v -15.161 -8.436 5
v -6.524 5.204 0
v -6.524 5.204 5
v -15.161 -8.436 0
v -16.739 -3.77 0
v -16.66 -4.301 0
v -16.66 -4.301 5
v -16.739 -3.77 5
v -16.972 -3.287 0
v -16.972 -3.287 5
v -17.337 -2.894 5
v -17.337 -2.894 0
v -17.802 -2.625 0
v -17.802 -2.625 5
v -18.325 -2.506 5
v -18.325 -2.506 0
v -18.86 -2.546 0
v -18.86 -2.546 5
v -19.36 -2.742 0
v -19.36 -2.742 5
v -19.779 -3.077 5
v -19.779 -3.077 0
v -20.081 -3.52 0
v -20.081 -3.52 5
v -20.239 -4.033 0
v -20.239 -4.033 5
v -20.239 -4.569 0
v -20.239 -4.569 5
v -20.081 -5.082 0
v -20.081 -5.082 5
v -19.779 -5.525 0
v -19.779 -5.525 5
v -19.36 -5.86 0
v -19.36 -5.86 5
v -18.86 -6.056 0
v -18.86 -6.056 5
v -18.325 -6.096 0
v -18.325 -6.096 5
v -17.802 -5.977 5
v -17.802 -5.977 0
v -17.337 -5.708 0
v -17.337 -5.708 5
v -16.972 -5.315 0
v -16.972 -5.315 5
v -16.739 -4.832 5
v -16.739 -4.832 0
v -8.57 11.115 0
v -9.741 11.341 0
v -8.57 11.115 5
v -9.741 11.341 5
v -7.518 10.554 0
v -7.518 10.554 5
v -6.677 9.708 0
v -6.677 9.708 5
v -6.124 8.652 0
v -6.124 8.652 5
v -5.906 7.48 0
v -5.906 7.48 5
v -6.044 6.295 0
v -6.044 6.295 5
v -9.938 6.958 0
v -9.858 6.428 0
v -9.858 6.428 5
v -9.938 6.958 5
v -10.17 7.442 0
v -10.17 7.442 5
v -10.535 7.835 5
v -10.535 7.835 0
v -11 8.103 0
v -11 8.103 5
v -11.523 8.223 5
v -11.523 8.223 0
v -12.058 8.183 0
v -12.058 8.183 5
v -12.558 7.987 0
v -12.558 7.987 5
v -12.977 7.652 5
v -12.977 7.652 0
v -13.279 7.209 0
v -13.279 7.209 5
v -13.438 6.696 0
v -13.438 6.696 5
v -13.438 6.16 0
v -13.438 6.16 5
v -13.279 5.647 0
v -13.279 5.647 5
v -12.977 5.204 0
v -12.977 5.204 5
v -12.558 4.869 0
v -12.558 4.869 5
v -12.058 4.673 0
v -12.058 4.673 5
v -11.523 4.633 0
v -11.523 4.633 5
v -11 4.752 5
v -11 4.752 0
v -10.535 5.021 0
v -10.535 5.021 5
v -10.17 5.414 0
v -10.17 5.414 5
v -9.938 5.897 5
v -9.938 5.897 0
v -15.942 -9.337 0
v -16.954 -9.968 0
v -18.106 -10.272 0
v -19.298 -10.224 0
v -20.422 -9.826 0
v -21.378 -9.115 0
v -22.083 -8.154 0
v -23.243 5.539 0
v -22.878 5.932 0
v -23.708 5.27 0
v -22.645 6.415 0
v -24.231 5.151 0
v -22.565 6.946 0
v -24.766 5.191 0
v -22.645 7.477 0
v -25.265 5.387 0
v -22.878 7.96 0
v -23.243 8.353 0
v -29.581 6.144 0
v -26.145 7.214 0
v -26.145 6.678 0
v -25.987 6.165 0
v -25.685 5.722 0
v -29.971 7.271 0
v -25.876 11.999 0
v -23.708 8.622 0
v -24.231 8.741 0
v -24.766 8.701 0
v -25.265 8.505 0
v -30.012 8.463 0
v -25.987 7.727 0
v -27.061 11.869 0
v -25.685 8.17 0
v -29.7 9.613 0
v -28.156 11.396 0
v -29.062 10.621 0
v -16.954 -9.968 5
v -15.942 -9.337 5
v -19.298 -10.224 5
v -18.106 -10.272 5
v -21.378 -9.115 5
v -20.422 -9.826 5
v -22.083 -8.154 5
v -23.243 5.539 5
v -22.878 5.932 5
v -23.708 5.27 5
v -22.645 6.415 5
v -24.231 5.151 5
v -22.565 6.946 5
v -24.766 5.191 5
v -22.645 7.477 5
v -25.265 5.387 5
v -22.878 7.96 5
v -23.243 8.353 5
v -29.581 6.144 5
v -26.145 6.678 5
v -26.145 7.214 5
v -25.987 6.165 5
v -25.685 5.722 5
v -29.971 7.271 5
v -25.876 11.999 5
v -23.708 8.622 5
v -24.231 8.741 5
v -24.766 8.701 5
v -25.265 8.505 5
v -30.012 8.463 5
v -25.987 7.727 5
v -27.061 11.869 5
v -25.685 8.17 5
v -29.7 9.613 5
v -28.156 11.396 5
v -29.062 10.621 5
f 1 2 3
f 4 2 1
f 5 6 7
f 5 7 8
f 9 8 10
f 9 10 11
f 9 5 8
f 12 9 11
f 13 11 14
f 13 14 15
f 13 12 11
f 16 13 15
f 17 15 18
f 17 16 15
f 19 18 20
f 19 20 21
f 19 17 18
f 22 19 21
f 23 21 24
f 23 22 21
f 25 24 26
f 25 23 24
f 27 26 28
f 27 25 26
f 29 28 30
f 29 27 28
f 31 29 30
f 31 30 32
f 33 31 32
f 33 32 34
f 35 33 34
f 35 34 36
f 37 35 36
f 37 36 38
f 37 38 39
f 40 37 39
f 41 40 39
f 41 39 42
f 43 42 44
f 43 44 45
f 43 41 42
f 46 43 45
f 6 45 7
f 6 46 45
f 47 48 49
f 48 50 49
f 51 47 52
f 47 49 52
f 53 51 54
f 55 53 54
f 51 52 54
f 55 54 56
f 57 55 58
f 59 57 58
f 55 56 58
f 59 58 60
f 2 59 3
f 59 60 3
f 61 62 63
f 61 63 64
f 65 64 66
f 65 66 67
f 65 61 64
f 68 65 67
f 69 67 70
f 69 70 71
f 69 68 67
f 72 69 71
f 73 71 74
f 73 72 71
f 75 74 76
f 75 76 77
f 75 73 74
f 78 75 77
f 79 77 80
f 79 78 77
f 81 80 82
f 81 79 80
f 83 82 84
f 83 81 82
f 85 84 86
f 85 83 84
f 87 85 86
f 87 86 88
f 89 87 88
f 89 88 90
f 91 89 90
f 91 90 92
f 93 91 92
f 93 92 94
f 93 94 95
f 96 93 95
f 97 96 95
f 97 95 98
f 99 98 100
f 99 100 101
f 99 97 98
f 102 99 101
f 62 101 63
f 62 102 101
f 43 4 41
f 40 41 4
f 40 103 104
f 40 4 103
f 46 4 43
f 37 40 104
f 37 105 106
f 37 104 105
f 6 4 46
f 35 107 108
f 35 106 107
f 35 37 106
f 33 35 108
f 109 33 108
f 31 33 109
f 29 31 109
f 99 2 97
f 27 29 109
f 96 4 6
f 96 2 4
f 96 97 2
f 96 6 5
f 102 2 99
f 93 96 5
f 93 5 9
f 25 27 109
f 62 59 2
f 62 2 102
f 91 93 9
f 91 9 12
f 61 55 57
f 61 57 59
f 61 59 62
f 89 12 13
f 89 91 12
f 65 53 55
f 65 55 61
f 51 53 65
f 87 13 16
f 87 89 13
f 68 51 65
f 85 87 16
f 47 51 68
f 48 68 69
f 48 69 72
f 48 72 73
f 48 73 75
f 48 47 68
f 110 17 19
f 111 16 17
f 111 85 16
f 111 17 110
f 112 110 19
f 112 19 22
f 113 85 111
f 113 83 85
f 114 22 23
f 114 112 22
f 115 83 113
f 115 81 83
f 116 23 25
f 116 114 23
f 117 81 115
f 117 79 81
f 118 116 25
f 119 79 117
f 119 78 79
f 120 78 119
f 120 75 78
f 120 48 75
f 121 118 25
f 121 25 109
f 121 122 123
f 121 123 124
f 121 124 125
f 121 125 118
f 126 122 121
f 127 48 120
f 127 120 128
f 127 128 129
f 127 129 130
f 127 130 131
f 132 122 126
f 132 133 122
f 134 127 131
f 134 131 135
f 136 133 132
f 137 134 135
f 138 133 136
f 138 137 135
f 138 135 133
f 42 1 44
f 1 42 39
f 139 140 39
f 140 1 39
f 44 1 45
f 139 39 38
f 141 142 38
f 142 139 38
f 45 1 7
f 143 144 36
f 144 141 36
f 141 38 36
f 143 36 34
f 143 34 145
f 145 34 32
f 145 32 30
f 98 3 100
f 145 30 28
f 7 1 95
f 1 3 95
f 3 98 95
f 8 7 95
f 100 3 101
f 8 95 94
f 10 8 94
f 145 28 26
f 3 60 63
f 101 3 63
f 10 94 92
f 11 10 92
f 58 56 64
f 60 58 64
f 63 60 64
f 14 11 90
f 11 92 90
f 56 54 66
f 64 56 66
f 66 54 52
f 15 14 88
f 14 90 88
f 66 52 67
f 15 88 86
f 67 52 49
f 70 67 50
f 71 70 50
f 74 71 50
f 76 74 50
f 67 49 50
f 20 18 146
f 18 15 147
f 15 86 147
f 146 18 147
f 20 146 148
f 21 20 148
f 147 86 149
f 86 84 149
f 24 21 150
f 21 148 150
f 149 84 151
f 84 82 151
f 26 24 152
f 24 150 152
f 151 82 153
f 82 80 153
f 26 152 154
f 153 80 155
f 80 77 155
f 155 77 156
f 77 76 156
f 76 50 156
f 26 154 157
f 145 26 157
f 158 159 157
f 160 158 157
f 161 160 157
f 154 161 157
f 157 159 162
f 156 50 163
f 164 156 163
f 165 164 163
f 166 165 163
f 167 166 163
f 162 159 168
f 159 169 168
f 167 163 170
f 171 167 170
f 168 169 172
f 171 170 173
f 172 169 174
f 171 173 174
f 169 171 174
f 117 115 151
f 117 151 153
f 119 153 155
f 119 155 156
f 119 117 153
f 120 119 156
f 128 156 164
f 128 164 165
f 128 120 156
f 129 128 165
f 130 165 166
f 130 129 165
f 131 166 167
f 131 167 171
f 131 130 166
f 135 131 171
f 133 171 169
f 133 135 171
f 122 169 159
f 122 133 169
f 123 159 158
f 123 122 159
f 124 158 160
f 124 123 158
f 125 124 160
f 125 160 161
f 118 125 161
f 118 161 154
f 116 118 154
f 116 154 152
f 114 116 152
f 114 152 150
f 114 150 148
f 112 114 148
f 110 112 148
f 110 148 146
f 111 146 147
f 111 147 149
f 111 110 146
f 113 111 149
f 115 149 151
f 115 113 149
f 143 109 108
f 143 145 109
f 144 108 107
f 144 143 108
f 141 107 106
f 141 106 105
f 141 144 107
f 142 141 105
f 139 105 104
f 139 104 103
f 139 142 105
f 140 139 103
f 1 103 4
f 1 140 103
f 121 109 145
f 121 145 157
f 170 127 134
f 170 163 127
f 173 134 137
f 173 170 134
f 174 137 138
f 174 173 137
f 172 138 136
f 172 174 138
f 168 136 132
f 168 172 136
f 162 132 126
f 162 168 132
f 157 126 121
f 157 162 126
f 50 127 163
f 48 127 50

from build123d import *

# Parameters (mm, degrees)
ESQUISSE1_R        = 1.8
BOSS_EXTRU_1_DEPTH = 5
CONG_1_R           = 4


with BuildPart() as part:
    # Esquisse1 → Boss.-Extru.1 (new body)
    with BuildSketch(Plane.XY):
        Polygon((-32.799356044, 12.280796054), (-2.817383551, 11.058367683), (-18.866700046, -14.287626874), align=None)
        with Locations((-18.459525699, -4.301037602)):
            Circle(ESQUISSE1_R, mode=Mode.SUBTRACT)
        with Locations((-24.365403682, 6.945977976)):
            Circle(ESQUISSE1_R, mode=Mode.SUBTRACT)
        with Locations((-11.657643474, 6.427855741)):
            Circle(ESQUISSE1_R, mode=Mode.SUBTRACT)
    extrude(amount=BOSS_EXTRU_1_DEPTH)

    # Congé1
    cong_1_edges = [part.edges().sort_by_distance(p)[0] for p in [
        (-32.799356044, 12.280796054, 2.5),
        (-2.817383551, 11.058367683, 2.5),
        (-18.866700046, -14.287626874, 2.5),
    ]]
    fillet(cong_1_edges, radius=CONG_1_R)


solid = part.part
